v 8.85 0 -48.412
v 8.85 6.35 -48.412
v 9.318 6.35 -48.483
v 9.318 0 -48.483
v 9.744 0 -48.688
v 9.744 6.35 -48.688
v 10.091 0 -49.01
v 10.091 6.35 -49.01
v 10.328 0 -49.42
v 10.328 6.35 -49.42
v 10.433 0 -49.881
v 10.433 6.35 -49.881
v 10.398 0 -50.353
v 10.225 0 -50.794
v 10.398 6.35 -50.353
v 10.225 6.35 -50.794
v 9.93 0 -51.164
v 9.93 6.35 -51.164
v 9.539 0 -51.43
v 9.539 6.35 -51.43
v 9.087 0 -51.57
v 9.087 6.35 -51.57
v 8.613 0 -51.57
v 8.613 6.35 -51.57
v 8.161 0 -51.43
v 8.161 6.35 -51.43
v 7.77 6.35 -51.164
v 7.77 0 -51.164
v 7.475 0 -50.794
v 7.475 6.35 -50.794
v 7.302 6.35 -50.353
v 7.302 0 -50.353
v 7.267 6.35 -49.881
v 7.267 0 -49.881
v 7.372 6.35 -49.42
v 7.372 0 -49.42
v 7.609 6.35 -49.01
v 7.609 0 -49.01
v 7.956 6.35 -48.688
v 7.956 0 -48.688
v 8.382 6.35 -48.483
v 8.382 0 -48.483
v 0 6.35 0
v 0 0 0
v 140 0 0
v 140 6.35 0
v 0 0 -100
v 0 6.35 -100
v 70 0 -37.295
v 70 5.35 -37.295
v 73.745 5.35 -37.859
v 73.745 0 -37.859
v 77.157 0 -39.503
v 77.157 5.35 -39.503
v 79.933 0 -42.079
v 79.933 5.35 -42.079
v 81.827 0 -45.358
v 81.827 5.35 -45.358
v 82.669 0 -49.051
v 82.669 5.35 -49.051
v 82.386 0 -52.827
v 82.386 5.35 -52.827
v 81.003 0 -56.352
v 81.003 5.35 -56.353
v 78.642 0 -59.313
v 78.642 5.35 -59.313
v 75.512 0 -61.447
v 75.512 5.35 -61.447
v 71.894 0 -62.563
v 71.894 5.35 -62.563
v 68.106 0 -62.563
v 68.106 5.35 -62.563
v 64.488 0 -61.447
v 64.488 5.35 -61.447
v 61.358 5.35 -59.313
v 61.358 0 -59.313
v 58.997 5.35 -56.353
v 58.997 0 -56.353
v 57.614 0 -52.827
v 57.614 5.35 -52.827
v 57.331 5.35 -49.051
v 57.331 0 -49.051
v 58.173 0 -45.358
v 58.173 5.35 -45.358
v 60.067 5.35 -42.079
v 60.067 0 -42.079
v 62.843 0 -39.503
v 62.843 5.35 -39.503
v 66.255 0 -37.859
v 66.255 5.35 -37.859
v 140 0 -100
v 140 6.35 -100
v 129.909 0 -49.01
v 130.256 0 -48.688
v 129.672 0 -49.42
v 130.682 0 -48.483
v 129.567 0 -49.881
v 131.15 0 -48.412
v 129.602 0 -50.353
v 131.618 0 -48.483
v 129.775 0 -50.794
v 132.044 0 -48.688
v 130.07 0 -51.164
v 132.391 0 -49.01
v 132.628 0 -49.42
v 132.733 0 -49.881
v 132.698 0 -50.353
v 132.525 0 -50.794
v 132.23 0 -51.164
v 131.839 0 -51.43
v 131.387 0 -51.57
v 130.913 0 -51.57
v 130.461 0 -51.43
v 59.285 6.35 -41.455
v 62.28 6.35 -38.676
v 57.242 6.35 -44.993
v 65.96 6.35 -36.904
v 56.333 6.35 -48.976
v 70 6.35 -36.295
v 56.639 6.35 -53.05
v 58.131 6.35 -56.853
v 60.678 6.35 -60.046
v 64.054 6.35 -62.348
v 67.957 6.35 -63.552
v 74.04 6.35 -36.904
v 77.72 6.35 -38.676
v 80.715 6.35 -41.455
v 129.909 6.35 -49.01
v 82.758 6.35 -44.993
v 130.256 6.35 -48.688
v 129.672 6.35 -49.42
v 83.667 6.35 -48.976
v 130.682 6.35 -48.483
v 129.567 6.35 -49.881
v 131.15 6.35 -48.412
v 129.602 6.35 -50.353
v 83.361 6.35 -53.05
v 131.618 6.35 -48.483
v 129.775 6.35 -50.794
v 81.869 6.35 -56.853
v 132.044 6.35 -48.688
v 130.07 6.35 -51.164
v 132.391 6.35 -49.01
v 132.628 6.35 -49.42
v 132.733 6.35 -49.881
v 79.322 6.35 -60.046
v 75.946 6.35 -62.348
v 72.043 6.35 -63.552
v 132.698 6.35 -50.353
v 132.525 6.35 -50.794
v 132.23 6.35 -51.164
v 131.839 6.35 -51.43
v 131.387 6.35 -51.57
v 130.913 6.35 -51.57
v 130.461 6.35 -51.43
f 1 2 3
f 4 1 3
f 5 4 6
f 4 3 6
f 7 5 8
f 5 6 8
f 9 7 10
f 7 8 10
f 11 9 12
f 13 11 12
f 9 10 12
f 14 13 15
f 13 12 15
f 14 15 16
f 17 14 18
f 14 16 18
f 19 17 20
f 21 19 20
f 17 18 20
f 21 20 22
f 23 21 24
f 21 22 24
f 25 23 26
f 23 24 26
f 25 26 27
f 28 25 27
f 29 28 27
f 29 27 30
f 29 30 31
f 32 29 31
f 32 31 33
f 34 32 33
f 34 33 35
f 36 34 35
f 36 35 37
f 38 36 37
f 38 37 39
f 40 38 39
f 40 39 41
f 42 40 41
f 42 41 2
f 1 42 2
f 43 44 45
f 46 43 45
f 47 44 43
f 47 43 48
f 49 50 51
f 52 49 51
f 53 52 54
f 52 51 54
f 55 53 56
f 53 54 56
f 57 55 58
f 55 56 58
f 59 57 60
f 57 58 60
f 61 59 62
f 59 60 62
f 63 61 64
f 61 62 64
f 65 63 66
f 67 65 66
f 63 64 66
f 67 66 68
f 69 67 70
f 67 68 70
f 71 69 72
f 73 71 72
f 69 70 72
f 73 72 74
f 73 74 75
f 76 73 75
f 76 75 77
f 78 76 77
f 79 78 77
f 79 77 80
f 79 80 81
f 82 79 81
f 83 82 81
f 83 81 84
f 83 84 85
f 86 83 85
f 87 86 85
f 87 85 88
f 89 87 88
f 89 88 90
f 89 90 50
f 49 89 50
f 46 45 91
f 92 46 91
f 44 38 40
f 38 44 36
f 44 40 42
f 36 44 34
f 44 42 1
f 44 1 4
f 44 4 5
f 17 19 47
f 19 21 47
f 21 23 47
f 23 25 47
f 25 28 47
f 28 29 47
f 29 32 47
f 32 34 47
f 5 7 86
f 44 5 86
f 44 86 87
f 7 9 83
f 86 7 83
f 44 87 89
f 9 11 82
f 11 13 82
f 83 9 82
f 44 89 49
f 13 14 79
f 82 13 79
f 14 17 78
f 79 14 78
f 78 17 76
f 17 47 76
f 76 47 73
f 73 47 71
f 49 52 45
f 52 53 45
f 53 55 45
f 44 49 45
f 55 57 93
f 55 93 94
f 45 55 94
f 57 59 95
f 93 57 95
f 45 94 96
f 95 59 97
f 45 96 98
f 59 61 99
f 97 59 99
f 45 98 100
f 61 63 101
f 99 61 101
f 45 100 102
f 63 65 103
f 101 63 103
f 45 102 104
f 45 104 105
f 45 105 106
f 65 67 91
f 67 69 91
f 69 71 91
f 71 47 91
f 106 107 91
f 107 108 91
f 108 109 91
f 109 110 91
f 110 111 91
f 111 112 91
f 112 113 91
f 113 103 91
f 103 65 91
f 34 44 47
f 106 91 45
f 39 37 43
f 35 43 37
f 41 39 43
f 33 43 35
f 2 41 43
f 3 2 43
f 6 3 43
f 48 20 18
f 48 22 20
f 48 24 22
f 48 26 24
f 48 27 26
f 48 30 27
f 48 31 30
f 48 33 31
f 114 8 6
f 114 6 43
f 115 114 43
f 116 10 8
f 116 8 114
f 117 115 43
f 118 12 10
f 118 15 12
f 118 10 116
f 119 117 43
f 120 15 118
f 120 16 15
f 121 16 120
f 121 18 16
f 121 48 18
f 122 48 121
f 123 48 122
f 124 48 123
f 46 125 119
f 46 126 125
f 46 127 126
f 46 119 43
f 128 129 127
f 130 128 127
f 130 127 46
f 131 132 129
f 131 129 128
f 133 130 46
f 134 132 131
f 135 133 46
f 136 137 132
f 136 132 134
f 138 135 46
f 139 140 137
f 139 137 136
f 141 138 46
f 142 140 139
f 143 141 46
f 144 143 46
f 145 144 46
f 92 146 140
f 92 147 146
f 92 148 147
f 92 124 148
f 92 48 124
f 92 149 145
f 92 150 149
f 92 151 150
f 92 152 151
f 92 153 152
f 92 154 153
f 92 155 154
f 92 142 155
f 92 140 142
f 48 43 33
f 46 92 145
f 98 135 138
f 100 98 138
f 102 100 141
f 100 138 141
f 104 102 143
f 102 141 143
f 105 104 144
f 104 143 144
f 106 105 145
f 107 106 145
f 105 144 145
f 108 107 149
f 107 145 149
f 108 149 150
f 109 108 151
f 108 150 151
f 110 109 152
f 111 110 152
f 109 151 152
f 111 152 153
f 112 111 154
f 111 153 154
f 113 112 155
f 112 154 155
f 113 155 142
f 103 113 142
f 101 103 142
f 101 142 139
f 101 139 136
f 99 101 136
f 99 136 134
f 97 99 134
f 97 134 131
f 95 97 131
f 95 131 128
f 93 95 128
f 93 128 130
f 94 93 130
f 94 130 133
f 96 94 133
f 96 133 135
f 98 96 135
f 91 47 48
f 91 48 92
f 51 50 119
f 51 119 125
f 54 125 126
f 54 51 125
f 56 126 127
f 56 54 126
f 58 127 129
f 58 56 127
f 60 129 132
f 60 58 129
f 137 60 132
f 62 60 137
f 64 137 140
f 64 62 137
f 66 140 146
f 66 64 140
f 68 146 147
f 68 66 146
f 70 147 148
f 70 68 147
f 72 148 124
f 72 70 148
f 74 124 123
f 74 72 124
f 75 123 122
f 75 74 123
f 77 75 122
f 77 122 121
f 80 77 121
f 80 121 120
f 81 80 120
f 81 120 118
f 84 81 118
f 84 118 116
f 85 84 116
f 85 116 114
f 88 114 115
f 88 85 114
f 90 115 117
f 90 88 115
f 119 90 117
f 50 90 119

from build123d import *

# Parameters (mm, degrees)
SKETCH1_W           = 140
SKETCH1_H           = 100
BOSS_EXTRUDE1_DEPTH = 6.35
SKETCH2_R           = 12.705
CUT_EXTRUDE1_DEPTH  = 10
SKETCH3_R           = 1.5875
CUT_EXTRUDE2_DEPTH  = 10
CHAMFER1_SIZE       = 1


with BuildPart() as part:
    # Sketch1 → Boss-Extrude1 (new body)
    with BuildSketch(Plane(origin=(0, 0, 0), x_dir=(1, 0, 0), z_dir=(0, 1, 0))):
        with Locations((70, 50)):
            Rectangle(SKETCH1_W, SKETCH1_H)
    extrude(amount=BOSS_EXTRUDE1_DEPTH)

    # Sketch2 → Cut-Extrude1 (cut)
    with BuildSketch(Plane(origin=(0, 6.35, 0), x_dir=(1, 0, 0), z_dir=(0, 1, 0))):
        with Locations(Location((70, 50, 0), (0, 0, 270))):
            Circle(SKETCH2_R)
    extrude(amount=-CUT_EXTRUDE1_DEPTH, mode=Mode.SUBTRACT)

    # Sketch3 → Cut-Extrude2 (cut)
    with BuildSketch(Plane(origin=(0, 6.35, 0), x_dir=(1, 0, 0), z_dir=(0, 1, 0))):
        with Locations(Location((8.85, 50, 0), (0, 0, 270))):
            Circle(SKETCH3_R)
        with Locations(Location((131.15, 50, 0), (0, 0, 270))):
            Circle(SKETCH3_R)
    extrude(amount=-CUT_EXTRUDE2_DEPTH, mode=Mode.SUBTRACT)

    # Chamfer1
    chamfer1_edges = [part.edges().sort_by_distance(p)[0] for p in [
        (70, 6.35, -62.705),
    ]]
    chamfer(chamfer1_edges, length=CHAMFER1_SIZE)


solid = part.part
